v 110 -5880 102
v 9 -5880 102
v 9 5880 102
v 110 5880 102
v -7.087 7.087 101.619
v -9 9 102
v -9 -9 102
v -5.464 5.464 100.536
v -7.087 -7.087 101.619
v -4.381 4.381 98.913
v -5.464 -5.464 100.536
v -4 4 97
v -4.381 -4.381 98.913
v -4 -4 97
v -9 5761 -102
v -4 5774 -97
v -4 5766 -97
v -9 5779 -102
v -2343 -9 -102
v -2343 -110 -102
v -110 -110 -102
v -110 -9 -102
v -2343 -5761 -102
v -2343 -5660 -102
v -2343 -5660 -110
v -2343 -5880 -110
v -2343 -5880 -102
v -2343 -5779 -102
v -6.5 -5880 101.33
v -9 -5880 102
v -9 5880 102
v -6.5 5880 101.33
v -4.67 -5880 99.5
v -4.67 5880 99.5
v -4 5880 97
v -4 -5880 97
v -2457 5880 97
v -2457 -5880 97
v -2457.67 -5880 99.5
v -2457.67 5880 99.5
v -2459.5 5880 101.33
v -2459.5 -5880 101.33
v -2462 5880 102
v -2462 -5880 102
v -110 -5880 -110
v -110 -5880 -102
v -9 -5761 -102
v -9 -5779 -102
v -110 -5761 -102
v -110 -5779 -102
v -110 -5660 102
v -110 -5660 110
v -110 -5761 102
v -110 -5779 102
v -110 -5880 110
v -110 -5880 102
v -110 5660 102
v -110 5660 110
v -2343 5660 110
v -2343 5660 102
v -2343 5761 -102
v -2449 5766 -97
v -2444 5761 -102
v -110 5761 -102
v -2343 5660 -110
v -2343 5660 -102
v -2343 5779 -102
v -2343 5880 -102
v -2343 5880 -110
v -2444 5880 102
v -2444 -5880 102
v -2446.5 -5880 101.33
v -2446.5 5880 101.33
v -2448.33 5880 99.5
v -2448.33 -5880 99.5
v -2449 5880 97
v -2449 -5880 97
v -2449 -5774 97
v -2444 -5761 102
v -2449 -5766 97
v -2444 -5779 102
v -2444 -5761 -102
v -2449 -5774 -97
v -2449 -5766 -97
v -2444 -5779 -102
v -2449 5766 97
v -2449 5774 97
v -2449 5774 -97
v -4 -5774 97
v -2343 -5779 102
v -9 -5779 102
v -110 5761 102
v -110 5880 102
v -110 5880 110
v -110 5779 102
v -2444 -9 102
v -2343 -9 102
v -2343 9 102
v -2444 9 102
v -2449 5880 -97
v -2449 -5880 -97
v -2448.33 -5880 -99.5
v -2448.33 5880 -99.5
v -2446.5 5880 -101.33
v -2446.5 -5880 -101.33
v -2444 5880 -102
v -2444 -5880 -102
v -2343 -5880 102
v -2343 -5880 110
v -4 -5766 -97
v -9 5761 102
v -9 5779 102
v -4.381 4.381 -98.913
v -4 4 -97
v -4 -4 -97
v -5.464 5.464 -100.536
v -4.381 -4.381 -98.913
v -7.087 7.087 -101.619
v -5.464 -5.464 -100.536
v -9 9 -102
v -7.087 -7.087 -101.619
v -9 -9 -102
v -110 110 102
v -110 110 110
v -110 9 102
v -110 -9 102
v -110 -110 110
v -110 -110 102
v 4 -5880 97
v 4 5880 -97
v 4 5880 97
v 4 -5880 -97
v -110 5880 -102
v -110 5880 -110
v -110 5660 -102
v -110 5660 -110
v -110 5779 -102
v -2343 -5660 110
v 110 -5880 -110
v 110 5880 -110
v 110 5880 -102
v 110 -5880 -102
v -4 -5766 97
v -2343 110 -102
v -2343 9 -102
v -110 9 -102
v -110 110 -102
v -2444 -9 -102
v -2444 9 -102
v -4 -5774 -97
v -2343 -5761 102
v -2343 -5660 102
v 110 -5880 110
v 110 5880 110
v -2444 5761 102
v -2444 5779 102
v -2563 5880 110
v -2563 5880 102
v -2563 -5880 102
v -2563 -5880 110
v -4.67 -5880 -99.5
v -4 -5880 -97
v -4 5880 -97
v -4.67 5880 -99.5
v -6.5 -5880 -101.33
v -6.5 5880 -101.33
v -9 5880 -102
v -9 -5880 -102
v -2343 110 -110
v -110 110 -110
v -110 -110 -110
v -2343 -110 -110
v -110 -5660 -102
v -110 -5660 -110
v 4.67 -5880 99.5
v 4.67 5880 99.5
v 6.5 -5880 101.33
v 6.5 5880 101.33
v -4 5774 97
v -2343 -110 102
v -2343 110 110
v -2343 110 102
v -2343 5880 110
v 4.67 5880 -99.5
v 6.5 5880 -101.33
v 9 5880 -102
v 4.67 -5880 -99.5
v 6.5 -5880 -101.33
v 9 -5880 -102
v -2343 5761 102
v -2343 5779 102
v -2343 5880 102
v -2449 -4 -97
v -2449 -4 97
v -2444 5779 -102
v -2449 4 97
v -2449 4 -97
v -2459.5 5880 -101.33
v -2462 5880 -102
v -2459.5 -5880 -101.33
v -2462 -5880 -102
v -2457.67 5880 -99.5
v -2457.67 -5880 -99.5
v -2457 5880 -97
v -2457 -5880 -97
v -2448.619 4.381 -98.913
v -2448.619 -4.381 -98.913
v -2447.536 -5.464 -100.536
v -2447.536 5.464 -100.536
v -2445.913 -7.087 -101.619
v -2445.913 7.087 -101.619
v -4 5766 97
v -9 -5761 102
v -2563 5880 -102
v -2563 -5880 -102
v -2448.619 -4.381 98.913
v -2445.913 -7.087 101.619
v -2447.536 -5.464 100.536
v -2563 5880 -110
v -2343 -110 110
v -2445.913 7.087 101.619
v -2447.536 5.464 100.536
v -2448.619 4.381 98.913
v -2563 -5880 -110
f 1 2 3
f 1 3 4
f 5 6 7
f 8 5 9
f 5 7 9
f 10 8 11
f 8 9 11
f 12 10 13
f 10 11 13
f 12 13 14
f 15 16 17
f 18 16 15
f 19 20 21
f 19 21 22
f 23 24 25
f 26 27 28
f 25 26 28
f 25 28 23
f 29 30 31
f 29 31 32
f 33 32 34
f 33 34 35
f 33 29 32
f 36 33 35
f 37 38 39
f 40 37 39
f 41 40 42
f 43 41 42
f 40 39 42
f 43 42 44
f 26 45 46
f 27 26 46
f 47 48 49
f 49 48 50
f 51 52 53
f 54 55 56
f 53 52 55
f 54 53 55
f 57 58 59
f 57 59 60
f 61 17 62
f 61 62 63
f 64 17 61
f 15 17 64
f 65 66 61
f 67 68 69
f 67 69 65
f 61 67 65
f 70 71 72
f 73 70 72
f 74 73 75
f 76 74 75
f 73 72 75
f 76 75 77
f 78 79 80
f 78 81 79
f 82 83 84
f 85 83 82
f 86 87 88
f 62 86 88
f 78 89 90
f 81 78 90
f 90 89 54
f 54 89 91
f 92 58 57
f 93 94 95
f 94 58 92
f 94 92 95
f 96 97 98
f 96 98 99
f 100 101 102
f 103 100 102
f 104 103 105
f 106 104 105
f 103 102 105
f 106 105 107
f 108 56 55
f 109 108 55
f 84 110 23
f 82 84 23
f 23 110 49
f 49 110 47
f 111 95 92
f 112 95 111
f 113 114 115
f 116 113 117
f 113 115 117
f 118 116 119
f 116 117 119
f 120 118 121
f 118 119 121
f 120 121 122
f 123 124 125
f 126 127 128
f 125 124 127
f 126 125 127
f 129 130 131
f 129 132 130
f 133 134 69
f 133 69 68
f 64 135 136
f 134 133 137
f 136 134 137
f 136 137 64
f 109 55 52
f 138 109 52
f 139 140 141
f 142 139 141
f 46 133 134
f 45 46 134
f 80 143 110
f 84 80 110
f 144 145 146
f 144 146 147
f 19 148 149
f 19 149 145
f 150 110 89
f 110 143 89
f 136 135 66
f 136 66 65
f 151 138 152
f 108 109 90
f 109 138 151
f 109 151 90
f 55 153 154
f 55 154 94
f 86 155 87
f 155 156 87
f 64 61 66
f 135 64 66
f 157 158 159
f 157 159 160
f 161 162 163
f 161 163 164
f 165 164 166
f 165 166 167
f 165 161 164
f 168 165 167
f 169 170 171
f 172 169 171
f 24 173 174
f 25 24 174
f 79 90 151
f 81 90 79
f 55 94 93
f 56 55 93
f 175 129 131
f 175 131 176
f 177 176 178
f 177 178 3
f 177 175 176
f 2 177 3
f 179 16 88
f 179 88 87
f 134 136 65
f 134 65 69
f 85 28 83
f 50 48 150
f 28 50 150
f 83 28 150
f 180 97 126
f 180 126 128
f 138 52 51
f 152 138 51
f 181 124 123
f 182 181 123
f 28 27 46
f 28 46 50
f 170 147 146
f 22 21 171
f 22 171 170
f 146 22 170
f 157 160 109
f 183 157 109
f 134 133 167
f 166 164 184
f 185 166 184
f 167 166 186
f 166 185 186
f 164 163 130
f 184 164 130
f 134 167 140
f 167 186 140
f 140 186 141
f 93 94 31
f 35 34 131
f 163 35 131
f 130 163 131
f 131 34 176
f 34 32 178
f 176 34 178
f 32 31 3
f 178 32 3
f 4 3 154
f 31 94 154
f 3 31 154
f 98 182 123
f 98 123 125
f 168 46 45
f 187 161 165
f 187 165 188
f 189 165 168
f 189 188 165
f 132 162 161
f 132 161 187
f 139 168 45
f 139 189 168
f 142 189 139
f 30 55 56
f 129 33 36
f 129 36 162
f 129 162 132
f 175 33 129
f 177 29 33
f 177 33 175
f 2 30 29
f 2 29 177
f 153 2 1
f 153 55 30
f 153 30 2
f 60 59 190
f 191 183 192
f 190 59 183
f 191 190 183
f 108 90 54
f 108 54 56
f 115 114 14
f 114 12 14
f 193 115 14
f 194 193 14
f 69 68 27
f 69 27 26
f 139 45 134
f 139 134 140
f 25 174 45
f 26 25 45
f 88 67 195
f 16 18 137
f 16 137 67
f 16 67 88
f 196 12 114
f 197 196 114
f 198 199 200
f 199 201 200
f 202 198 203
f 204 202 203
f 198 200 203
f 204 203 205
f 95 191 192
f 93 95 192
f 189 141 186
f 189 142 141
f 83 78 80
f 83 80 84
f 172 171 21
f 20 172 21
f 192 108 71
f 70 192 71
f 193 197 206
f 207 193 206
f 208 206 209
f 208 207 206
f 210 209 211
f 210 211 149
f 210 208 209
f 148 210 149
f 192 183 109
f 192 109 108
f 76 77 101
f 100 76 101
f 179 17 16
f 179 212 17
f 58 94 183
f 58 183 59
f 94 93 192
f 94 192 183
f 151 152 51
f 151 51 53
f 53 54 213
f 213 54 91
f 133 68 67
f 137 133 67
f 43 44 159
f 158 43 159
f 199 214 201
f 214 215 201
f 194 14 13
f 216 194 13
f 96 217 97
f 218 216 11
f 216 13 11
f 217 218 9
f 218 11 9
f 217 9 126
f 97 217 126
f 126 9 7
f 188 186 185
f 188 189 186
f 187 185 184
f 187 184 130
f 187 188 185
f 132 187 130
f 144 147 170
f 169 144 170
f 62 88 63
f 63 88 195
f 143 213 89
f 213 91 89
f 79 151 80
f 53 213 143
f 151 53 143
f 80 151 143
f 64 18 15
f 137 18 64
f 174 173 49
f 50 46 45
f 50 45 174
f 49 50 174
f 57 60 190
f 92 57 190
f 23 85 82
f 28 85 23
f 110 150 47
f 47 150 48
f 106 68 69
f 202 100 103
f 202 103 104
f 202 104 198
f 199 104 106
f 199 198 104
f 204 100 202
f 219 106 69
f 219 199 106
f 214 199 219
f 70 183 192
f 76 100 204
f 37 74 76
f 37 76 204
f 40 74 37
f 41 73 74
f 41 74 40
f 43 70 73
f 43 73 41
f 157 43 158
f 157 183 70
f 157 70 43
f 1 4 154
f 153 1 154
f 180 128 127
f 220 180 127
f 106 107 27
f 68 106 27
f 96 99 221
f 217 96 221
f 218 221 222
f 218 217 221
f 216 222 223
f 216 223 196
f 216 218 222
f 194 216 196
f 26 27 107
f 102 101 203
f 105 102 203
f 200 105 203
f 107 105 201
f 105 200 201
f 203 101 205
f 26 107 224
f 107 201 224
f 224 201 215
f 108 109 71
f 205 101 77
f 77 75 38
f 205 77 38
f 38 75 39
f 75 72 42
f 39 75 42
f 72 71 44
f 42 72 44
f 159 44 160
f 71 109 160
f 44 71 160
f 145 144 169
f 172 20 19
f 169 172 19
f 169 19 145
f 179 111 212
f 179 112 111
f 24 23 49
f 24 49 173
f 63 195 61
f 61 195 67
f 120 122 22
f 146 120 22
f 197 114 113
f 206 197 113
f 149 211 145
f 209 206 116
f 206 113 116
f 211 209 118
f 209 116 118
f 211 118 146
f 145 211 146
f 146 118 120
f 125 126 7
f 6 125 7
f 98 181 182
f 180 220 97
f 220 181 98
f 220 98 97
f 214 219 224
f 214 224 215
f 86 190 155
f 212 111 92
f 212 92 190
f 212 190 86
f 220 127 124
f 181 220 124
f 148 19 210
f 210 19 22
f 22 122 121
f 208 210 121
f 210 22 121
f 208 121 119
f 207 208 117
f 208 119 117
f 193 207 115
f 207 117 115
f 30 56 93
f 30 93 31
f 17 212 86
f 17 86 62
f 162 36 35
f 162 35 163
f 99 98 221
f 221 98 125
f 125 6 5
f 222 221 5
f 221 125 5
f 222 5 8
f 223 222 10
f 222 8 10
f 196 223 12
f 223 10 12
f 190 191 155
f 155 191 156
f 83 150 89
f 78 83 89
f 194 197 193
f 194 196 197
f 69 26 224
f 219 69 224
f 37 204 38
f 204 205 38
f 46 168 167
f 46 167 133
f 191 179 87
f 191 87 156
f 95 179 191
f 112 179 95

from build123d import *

# Parameters (mm, degrees)
F1_DEPTH = 5880
F3_DEPTH = 2453
F9_DEPTH = 2445


with BuildPart() as f1:
    # F0 (on Front) → F1 (new body, symmetric)
    with BuildSketch(Plane.XZ):
        with BuildLine():
            Line((4, -97), (4, 0))
            Line((4, 0), (4, 97))
            ThreePointArc((4, 97), (5.4644660941, 100.5355339059), (9, 102))
            Line((9, 102), (110, 102))
            Line((110, 102), (110, 110))
            Line((110, 110), (0, 110))
            Line((0, 110), (-110, 110))
            Line((-110, 110), (-110, 102))
            Line((-110, 102), (-9, 102))
            ThreePointArc((-9, 102), (-5.4644660941, 100.5355339059), (-4, 97))
            Line((-4, 97), (-4, 0))
            Line((-4, 0), (-4, -97))
            ThreePointArc((-4, -97), (-5.4644660941, -100.5355339059), (-9, -102))
            Line((-9, -102), (-110, -102))
            Line((-110, -102), (-110, -110))
            Line((-110, -110), (0, -110))
            Line((0, -110), (110, -110))
            Line((110, -110), (110, -102))
            Line((110, -102), (9, -102))
            ThreePointArc((9, -102), (5.4644660941, -100.5355339059), (4, -97))
        make_face()
    extrude(amount=F1_DEPTH, both=True)


with BuildPart() as f3:
    # F2 (on face) → F3 (new body)
    with BuildSketch(Plane(origin=(-4, 0, 0), x_dir=(0, -1, 0), z_dir=(-1, 0, 0))):
        with BuildLine():
            Line((5774, -97), (5774, 0))
            Line((5774, 0), (5774, 97))
            ThreePointArc((5774, 97), (5775.4644660941, 100.5355339059), (5779, 102))
            Line((5779, 102), (5880, 102))
            Line((5880, 102), (5880, 110))
            Line((5880, 110), (5770, 110))
            Line((5770, 110), (5660, 110))
            Line((5660, 110), (5660, 102))
            Line((5660, 102), (5761, 102))
            ThreePointArc((5761, 102), (5764.5355339059, 100.5355339059), (5766, 97))
            Line((5766, 97), (5766, 0))
            Line((5766, 0), (5766, -97))
            ThreePointArc((5766, -97), (5764.5355339059, -100.5355339059), (5761, -102))
            Line((5761, -102), (5660, -102))
            Line((5660, -102), (5660, -110))
            Line((5660, -110), (5770, -110))
            Line((5770, -110), (5880, -110))
            Line((5880, -110), (5880, -102))
            Line((5880, -102), (5779, -102))
            ThreePointArc((5779, -102), (5775.4644660941, -100.5355339059), (5774, -97))
        make_face()
    extrude(amount=F3_DEPTH)


with BuildPart() as f5_1:
    # F5: instance of F1
    add(f1.part.mirror(Plane.YZ.offset(-1226.5)))


with BuildPart() as f3_1:
    add(f3.part)

    # F6: cut F1, F5_1
    add(f1.part, mode=Mode.SUBTRACT)
    add(f5_1.part, mode=Mode.SUBTRACT)


with BuildPart() as f7_1:
    # F7: instance of F3
    add(f3_1.part.mirror(Plane.XZ))


with BuildPart() as f9:
    # F8 (on face) → F9 (new body, through all)
    with BuildSketch(Plane(origin=(-4, 0, 0), x_dir=(0, -1, 0), z_dir=(-1, 0, 0))):
        with BuildLine():
            Line((4, -97), (4, 0))
            Line((4, 0), (4, 97))
            ThreePointArc((4, 97), (5.4644660941, 100.5355339059), (9, 102))
            Line((9, 102), (110, 102))
            Line((110, 102), (110, 110))
            Line((110, 110), (0, 110))
            Line((0, 110), (-110, 110))
            Line((-110, 110), (-110, 102))
            Line((-110, 102), (-9, 102))
            ThreePointArc((-9, 102), (-5.4644660941, 100.5355339059), (-4, 97))
            Line((-4, 97), (-4, 0))
            Line((-4, 0), (-4, -97))
            ThreePointArc((-4, -97), (-5.4644660941, -100.5355339059), (-9, -102))
            Line((-9, -102), (-110, -102))
            Line((-110, -102), (-110, -110))
            Line((-110, -110), (0, -110))
            Line((0, -110), (110, -110))
            Line((110, -110), (110, -102))
            Line((110, -102), (9, -102))
            ThreePointArc((9, -102), (5.4644660941, -100.5355339059), (4, -97))
        make_face()
    extrude(amount=F9_DEPTH)

    # F10: cut F5_1, F1
    add(f5_1.part, mode=Mode.SUBTRACT)
    add(f1.part, mode=Mode.SUBTRACT)


solid = Compound([f1.part, f5_1.part, f3_1.part, f7_1.part, f9.part])
